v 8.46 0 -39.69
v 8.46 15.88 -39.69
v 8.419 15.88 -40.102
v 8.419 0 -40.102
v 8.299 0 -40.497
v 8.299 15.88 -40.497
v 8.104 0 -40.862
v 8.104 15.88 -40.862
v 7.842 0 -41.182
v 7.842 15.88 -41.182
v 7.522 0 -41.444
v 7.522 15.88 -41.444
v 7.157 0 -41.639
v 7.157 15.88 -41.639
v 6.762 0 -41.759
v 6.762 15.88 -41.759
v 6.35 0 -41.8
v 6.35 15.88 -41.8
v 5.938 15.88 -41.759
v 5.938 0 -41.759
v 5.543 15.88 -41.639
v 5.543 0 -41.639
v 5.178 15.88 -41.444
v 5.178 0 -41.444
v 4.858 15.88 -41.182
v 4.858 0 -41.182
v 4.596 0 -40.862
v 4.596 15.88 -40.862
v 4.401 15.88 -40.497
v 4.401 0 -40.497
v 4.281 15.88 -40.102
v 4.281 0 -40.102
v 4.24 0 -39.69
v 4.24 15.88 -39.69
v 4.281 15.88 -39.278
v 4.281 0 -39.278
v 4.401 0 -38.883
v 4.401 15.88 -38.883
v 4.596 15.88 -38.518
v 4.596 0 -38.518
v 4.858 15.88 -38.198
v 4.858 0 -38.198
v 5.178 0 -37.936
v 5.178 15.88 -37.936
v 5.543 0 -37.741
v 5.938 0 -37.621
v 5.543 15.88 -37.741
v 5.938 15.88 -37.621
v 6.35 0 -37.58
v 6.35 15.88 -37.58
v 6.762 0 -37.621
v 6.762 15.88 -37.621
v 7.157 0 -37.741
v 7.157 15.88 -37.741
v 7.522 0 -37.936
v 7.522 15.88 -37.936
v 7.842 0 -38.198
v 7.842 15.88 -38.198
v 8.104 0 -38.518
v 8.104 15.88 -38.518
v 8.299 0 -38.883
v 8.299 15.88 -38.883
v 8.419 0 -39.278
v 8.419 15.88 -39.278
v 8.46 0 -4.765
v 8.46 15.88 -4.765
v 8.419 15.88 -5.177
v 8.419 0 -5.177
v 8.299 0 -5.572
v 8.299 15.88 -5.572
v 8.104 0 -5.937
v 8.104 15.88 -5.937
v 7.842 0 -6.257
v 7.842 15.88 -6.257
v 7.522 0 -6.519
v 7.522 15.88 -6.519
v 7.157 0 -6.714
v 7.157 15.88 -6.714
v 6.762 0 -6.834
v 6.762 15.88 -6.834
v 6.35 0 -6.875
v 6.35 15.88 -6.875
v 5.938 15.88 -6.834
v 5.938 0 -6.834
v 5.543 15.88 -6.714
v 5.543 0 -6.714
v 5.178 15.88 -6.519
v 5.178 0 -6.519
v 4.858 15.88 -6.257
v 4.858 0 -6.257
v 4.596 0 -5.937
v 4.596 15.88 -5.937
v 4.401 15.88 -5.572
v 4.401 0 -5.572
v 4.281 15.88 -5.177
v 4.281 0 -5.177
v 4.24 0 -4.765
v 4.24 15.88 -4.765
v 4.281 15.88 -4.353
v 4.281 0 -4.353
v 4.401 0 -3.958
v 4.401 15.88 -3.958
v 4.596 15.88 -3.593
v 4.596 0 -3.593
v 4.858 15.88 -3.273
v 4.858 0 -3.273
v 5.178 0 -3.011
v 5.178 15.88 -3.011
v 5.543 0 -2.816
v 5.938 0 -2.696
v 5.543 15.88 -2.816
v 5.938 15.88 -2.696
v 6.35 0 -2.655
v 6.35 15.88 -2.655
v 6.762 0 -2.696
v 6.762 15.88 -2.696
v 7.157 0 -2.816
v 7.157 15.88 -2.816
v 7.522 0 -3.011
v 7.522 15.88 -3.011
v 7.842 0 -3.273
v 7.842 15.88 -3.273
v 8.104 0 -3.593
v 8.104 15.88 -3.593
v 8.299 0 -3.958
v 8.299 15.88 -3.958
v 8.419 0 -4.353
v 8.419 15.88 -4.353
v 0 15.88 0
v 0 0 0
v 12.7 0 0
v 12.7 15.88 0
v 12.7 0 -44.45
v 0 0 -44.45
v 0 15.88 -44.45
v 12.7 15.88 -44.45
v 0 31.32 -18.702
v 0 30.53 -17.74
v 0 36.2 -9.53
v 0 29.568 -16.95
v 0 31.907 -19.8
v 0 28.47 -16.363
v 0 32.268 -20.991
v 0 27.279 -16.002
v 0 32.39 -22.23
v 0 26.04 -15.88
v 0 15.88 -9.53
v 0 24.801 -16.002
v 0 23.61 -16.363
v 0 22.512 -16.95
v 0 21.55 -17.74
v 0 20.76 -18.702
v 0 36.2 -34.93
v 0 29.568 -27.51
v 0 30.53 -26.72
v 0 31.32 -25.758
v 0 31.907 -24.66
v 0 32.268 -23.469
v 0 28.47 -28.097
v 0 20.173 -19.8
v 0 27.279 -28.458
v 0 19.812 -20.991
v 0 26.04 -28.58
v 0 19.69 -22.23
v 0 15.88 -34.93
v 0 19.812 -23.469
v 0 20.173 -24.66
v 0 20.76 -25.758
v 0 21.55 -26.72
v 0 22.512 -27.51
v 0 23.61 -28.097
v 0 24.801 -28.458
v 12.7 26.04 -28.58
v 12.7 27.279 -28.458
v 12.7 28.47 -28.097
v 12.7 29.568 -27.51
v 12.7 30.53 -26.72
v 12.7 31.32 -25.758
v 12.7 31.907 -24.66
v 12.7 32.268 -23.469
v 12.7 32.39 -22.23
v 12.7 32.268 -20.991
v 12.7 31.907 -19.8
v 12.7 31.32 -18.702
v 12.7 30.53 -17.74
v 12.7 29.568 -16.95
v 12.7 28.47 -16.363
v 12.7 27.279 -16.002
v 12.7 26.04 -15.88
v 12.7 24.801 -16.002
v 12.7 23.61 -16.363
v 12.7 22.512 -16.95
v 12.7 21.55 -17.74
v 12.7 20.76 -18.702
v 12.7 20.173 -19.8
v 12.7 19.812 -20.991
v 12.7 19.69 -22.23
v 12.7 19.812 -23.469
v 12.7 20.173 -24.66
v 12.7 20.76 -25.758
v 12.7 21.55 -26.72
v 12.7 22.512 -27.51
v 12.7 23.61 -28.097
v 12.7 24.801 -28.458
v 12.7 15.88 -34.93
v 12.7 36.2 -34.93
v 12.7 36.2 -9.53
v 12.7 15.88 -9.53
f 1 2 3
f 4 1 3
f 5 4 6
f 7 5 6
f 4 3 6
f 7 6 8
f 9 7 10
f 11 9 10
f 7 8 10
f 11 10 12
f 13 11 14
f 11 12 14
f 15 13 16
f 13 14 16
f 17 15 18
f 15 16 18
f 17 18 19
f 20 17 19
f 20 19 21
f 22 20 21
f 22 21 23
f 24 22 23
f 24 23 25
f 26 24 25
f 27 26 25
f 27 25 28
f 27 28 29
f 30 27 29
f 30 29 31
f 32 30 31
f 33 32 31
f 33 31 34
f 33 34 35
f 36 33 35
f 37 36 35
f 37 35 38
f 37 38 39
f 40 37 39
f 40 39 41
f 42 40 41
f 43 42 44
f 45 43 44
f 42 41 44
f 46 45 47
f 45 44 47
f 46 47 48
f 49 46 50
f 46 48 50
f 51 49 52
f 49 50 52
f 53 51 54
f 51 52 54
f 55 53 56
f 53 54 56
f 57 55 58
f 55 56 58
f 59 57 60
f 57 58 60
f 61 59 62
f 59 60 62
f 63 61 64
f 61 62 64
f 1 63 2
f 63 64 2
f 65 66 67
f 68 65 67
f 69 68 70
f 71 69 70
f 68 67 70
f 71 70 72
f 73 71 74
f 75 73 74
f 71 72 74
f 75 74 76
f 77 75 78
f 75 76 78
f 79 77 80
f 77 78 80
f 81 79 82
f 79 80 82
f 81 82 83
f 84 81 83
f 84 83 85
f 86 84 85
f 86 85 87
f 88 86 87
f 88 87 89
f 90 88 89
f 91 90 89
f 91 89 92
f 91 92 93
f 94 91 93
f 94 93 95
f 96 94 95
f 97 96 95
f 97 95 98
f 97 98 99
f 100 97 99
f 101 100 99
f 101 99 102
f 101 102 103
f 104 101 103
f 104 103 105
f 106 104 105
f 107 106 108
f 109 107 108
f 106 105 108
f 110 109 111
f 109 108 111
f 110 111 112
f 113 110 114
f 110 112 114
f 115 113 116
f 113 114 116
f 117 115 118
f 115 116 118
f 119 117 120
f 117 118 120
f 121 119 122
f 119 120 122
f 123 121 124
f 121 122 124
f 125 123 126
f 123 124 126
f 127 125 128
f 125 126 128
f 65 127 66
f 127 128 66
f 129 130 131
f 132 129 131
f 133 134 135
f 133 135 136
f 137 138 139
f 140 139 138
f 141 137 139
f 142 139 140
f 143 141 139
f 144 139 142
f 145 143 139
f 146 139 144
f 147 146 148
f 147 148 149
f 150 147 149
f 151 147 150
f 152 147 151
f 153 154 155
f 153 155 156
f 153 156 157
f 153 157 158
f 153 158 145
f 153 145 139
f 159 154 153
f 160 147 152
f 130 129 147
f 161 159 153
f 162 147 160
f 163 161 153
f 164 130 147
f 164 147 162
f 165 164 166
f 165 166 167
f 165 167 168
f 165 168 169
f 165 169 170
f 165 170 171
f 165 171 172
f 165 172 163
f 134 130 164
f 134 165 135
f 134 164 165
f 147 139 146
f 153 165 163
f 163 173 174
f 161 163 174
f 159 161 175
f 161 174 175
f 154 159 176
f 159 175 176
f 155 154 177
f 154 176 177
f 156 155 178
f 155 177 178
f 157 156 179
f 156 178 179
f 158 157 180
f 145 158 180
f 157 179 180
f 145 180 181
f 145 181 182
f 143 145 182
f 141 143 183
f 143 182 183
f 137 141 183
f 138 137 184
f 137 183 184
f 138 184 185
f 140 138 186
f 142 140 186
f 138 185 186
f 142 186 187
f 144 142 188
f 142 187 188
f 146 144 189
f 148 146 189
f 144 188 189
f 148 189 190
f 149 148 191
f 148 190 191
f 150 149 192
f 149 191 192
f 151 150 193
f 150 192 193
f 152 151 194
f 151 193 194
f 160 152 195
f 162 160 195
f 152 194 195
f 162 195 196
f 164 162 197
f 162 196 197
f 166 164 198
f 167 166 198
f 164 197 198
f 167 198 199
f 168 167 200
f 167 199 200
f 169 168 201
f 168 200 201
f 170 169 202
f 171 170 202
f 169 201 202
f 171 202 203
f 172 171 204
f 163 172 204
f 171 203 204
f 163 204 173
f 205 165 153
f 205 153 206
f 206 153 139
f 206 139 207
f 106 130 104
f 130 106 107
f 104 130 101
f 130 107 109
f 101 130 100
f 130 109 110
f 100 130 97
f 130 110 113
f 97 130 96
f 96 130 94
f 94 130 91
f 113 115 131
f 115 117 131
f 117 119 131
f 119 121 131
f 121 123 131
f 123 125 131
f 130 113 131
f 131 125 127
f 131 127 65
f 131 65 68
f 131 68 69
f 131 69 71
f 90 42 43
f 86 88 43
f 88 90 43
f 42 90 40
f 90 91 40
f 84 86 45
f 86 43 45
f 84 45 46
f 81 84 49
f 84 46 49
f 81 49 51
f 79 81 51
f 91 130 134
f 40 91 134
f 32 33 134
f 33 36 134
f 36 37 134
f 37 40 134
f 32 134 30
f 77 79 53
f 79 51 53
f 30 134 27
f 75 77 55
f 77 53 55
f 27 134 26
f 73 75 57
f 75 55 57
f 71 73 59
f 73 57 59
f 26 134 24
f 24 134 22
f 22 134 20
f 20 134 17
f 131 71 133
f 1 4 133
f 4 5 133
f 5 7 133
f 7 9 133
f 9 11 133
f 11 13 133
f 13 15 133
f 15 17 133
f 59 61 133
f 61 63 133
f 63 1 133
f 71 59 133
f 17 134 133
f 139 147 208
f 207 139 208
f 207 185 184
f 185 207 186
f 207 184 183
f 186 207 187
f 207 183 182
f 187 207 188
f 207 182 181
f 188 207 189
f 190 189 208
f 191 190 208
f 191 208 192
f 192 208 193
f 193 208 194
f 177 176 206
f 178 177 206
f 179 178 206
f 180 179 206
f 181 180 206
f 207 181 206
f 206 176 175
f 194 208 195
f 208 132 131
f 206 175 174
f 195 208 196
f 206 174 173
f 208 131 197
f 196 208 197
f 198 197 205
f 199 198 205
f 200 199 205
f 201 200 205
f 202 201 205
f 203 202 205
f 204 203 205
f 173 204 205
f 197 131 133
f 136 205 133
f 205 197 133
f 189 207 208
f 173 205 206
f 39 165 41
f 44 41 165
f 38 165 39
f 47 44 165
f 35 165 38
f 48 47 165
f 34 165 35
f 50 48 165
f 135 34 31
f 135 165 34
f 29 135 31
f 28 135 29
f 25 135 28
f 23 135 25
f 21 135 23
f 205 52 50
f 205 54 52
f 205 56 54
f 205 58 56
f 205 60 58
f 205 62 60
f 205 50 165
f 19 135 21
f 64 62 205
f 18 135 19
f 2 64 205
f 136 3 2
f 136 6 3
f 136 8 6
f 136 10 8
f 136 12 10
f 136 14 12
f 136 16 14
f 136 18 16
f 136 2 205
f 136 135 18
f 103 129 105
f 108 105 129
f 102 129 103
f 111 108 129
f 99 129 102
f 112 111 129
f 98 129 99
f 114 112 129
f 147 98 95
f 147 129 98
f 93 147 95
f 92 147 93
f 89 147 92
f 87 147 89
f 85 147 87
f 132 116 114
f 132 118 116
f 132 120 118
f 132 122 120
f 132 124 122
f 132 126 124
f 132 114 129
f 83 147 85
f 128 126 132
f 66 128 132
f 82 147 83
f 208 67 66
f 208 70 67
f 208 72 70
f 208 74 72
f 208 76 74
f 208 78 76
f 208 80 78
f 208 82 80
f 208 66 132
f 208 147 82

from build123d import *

# Parameters (mm, degrees)
SKETCH2_W           = 12.7
SKETCH2_H           = 44.45
BOSS_EXTRUDE1_DEPTH = 15.88
SKETCH4_W           = 12.7
SKETCH4_H           = 25.4
BOSS_EXTRUDE2_DEPTH = 20.32
SKETCH5_R           = 6.35
CUT_EXTRUDE1_DEPTH  = 12.7
SKETCH6_R           = 2.11
CUT_EXTRUDE2_DEPTH  = 20.7
SKETCH7_R           = 2.11
CUT_EXTRUDE3_DEPTH  = 16.7


with BuildPart() as part:
    # Sketch2 → Boss-Extrude1 (new body)
    with BuildSketch(Plane(origin=(0, 0, 0), x_dir=(1, 0, 0), z_dir=(0, 1, 0))):
        with Locations((6.35, 22.225)):
            Rectangle(SKETCH2_W, SKETCH2_H)
    extrude(amount=BOSS_EXTRUDE1_DEPTH)

    # Sketch4 → Boss-Extrude2 (add)
    with BuildSketch(Plane(origin=(0, 15.88, 0), x_dir=(1, 0, 0), z_dir=(0, 1, 0))):
        with Locations((6.35, 22.23)):
            Rectangle(SKETCH4_W, SKETCH4_H)
    extrude(amount=BOSS_EXTRUDE2_DEPTH)

    # Sketch5 → Cut-Extrude1 (cut)
    with BuildSketch(Plane(origin=(12.7, 0, 0), x_dir=(0, 0, -1), z_dir=(1, 0, 0))):
        with Locations((22.23, 26.04)):
            Circle(SKETCH5_R)
    extrude(amount=-CUT_EXTRUDE1_DEPTH, mode=Mode.SUBTRACT)

    # Sketch6 → Cut-Extrude2 (cut)
    with BuildSketch(Plane(origin=(0, 15.88, 0), x_dir=(1, 0, 0), z_dir=(0, 1, 0))):
        with Locations((6.35, 39.69)):
            Circle(SKETCH6_R)
    extrude(amount=-CUT_EXTRUDE2_DEPTH, mode=Mode.SUBTRACT)

    # Sketch7 → Cut-Extrude3 (cut)
    with BuildSketch(Plane(origin=(0, 15.88, 0), x_dir=(1, 0, 0), z_dir=(0, 1, 0))):
        with Locations((6.35, 4.765)):
            Circle(SKETCH7_R)
    extrude(amount=-CUT_EXTRUDE3_DEPTH, mode=Mode.SUBTRACT)


solid = part.part
